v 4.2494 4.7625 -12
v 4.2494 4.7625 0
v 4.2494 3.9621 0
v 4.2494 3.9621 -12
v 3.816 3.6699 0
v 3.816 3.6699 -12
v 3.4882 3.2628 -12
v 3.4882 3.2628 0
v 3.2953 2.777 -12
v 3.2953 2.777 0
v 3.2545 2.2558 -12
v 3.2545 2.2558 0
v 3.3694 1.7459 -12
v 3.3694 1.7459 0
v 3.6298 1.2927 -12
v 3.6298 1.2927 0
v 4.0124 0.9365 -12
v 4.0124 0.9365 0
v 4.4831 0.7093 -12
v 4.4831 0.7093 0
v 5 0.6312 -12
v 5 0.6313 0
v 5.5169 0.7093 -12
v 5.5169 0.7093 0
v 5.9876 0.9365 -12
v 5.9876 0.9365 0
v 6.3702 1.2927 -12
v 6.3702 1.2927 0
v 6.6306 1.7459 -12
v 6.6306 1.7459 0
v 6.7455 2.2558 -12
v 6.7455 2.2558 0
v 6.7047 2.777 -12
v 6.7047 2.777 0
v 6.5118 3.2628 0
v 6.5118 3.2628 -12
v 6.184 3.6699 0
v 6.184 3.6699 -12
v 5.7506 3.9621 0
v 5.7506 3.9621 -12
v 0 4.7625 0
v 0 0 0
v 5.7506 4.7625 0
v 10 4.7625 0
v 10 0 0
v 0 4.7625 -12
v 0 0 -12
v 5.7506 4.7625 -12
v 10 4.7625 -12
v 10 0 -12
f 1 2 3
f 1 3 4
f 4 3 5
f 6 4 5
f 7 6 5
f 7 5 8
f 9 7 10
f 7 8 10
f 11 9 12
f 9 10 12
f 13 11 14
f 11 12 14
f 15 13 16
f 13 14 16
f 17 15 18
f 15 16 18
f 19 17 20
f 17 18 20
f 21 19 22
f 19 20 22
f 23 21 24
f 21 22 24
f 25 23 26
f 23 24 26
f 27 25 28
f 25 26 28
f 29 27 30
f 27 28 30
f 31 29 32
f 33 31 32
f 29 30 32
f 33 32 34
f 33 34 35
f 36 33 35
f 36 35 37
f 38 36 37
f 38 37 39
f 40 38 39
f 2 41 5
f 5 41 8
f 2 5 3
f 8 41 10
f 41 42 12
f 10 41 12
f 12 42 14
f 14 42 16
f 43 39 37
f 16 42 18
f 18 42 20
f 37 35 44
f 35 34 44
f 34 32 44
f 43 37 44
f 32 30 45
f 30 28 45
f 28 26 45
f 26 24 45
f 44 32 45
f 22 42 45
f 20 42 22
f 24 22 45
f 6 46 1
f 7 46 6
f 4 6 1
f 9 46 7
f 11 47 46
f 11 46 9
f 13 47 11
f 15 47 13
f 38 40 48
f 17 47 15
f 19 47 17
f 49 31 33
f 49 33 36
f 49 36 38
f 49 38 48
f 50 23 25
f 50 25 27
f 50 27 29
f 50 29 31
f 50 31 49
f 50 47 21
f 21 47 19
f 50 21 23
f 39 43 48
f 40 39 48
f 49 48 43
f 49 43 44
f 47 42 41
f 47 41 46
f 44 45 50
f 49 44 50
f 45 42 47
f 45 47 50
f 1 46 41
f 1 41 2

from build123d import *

# Parameters (mm, degrees)
SKETCH1_W           = 10
SKETCH1_H           = 12
BOSS_EXTRUDE1_DEPTH = 4.7625
SKETCH2_R           = 1.75
CUT_EXTRUDE1_DEPTH  = 12.7625
SKETCH4_W           = 1.501109308
SKETCH4_H           = 12
CUT_EXTRUDE2_DEPTH  = 1


with BuildPart() as part:
    # Sketch1 → Boss-Extrude1 (new body)
    with BuildSketch(Plane(origin=(0, 0, 0), x_dir=(1, 0, 0), z_dir=(0, 1, 0))):
        with Locations((5, 6)):
            Rectangle(SKETCH1_W, SKETCH1_H)
    extrude(amount=BOSS_EXTRUDE1_DEPTH)

    # Sketch2 → Cut-Extrude1 (cut)
    with BuildSketch(Plane.XY):
        with Locations((5, 2.38125)):
            Circle(SKETCH2_R)
    extrude(amount=-CUT_EXTRUDE1_DEPTH, mode=Mode.SUBTRACT)

    # Sketch4 → Cut-Extrude2 (cut)
    with BuildSketch(Plane(origin=(0, 4.7625, 0), x_dir=(1, 0, 0), z_dir=(0, 1, 0))):
        with Locations((5, 6)):
            Rectangle(SKETCH4_W, SKETCH4_H)
    extrude(amount=-CUT_EXTRUDE2_DEPTH, mode=Mode.SUBTRACT)


solid = part.part
